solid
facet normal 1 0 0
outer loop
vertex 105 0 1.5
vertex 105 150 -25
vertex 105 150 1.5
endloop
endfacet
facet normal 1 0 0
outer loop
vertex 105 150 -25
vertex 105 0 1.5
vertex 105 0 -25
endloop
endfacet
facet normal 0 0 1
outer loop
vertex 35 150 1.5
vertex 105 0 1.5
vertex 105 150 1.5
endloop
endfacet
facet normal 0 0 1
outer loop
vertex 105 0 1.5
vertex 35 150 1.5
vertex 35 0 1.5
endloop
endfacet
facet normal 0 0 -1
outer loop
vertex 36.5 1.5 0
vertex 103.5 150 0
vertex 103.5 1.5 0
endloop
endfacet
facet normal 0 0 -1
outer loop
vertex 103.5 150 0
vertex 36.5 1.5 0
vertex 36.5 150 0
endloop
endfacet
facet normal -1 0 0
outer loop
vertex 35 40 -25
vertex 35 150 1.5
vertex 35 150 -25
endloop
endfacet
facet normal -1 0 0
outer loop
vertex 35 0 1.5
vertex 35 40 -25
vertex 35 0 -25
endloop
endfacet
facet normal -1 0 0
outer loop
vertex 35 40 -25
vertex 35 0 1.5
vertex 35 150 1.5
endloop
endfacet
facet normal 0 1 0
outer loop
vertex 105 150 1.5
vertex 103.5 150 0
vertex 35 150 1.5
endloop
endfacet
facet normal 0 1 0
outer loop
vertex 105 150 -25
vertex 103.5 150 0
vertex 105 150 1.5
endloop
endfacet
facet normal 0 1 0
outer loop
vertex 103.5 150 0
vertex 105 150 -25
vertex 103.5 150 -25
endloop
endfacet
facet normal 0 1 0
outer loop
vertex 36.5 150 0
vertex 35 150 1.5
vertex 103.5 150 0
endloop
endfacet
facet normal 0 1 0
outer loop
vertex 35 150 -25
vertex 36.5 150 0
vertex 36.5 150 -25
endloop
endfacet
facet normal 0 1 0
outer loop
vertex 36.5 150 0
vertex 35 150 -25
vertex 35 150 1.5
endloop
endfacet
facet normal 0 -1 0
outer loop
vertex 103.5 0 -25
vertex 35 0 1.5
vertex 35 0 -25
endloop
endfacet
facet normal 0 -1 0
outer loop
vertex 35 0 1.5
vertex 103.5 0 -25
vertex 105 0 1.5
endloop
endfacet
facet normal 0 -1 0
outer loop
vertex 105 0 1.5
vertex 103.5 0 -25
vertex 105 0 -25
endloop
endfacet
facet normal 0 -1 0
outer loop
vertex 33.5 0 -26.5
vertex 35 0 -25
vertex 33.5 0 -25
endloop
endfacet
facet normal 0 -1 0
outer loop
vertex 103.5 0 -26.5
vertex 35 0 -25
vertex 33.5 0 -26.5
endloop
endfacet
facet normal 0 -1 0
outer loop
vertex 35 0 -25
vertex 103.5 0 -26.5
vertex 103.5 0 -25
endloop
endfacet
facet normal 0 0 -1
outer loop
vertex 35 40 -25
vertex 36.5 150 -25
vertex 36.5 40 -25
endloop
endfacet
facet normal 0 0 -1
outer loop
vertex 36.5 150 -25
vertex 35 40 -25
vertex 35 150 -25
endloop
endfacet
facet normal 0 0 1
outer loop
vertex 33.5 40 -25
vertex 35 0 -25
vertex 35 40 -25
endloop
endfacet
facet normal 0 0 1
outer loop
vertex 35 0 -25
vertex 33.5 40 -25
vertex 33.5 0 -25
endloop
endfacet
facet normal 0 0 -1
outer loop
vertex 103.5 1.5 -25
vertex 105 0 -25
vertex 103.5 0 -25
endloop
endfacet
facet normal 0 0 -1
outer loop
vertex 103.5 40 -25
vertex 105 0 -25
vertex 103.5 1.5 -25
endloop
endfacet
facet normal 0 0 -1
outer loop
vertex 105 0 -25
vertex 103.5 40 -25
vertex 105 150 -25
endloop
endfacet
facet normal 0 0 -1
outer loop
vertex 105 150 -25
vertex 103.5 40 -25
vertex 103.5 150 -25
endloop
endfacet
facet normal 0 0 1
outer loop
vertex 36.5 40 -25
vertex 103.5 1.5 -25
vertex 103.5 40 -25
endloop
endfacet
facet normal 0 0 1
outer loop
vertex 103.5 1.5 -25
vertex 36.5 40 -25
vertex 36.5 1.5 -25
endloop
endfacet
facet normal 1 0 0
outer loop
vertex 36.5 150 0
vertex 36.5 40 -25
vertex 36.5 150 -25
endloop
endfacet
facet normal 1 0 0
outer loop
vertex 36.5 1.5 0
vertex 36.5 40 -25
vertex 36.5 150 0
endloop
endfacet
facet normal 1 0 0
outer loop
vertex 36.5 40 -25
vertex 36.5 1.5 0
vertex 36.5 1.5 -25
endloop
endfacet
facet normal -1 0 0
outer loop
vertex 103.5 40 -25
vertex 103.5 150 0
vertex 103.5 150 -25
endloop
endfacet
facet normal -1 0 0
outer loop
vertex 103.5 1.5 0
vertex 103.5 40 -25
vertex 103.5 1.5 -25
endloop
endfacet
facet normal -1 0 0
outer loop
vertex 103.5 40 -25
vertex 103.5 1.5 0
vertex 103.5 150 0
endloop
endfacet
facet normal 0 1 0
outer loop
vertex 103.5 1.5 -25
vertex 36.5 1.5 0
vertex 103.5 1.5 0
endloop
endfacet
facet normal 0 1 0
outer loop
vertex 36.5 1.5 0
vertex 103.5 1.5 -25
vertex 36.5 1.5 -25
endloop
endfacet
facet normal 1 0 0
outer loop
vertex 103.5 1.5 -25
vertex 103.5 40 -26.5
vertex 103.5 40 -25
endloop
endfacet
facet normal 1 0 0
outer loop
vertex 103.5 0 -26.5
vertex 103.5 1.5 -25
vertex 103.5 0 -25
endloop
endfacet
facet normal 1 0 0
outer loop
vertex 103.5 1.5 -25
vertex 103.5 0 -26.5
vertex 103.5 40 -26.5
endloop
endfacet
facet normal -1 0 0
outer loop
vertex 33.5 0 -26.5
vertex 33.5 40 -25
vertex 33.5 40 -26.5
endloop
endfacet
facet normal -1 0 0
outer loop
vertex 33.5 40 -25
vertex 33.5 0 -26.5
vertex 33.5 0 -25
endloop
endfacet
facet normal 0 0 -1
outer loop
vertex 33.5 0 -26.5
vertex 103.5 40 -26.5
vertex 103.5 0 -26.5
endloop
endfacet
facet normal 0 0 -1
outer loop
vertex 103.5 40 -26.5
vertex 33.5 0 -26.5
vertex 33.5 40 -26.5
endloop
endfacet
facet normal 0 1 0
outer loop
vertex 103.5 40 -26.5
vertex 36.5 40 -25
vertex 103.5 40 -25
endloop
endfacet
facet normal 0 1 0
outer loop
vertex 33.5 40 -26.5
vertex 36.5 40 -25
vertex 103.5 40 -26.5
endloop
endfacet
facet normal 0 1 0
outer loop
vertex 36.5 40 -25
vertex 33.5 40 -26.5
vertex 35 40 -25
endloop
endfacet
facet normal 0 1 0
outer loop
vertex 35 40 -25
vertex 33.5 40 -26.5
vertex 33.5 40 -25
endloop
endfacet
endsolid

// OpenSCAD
translate([35,0,0]) {
    union() {
        cube([70,150,1.5]);
        rotate([0,90,0]) {
            cube([25,150,1.5]);
        }
        rotate([0,90,0]) {
            translate([0,0,68.5]) {
                cube([25,150,1.5]);
            }
        }
        rotate([270,0,0]) {
            cube([70,25,1.5]);
        }
        translate ([68.5,0,-25]) {
            rotate([180,$t*90,180]) {
                cube([70,40,1.5]);
            }
        }
    }
}
